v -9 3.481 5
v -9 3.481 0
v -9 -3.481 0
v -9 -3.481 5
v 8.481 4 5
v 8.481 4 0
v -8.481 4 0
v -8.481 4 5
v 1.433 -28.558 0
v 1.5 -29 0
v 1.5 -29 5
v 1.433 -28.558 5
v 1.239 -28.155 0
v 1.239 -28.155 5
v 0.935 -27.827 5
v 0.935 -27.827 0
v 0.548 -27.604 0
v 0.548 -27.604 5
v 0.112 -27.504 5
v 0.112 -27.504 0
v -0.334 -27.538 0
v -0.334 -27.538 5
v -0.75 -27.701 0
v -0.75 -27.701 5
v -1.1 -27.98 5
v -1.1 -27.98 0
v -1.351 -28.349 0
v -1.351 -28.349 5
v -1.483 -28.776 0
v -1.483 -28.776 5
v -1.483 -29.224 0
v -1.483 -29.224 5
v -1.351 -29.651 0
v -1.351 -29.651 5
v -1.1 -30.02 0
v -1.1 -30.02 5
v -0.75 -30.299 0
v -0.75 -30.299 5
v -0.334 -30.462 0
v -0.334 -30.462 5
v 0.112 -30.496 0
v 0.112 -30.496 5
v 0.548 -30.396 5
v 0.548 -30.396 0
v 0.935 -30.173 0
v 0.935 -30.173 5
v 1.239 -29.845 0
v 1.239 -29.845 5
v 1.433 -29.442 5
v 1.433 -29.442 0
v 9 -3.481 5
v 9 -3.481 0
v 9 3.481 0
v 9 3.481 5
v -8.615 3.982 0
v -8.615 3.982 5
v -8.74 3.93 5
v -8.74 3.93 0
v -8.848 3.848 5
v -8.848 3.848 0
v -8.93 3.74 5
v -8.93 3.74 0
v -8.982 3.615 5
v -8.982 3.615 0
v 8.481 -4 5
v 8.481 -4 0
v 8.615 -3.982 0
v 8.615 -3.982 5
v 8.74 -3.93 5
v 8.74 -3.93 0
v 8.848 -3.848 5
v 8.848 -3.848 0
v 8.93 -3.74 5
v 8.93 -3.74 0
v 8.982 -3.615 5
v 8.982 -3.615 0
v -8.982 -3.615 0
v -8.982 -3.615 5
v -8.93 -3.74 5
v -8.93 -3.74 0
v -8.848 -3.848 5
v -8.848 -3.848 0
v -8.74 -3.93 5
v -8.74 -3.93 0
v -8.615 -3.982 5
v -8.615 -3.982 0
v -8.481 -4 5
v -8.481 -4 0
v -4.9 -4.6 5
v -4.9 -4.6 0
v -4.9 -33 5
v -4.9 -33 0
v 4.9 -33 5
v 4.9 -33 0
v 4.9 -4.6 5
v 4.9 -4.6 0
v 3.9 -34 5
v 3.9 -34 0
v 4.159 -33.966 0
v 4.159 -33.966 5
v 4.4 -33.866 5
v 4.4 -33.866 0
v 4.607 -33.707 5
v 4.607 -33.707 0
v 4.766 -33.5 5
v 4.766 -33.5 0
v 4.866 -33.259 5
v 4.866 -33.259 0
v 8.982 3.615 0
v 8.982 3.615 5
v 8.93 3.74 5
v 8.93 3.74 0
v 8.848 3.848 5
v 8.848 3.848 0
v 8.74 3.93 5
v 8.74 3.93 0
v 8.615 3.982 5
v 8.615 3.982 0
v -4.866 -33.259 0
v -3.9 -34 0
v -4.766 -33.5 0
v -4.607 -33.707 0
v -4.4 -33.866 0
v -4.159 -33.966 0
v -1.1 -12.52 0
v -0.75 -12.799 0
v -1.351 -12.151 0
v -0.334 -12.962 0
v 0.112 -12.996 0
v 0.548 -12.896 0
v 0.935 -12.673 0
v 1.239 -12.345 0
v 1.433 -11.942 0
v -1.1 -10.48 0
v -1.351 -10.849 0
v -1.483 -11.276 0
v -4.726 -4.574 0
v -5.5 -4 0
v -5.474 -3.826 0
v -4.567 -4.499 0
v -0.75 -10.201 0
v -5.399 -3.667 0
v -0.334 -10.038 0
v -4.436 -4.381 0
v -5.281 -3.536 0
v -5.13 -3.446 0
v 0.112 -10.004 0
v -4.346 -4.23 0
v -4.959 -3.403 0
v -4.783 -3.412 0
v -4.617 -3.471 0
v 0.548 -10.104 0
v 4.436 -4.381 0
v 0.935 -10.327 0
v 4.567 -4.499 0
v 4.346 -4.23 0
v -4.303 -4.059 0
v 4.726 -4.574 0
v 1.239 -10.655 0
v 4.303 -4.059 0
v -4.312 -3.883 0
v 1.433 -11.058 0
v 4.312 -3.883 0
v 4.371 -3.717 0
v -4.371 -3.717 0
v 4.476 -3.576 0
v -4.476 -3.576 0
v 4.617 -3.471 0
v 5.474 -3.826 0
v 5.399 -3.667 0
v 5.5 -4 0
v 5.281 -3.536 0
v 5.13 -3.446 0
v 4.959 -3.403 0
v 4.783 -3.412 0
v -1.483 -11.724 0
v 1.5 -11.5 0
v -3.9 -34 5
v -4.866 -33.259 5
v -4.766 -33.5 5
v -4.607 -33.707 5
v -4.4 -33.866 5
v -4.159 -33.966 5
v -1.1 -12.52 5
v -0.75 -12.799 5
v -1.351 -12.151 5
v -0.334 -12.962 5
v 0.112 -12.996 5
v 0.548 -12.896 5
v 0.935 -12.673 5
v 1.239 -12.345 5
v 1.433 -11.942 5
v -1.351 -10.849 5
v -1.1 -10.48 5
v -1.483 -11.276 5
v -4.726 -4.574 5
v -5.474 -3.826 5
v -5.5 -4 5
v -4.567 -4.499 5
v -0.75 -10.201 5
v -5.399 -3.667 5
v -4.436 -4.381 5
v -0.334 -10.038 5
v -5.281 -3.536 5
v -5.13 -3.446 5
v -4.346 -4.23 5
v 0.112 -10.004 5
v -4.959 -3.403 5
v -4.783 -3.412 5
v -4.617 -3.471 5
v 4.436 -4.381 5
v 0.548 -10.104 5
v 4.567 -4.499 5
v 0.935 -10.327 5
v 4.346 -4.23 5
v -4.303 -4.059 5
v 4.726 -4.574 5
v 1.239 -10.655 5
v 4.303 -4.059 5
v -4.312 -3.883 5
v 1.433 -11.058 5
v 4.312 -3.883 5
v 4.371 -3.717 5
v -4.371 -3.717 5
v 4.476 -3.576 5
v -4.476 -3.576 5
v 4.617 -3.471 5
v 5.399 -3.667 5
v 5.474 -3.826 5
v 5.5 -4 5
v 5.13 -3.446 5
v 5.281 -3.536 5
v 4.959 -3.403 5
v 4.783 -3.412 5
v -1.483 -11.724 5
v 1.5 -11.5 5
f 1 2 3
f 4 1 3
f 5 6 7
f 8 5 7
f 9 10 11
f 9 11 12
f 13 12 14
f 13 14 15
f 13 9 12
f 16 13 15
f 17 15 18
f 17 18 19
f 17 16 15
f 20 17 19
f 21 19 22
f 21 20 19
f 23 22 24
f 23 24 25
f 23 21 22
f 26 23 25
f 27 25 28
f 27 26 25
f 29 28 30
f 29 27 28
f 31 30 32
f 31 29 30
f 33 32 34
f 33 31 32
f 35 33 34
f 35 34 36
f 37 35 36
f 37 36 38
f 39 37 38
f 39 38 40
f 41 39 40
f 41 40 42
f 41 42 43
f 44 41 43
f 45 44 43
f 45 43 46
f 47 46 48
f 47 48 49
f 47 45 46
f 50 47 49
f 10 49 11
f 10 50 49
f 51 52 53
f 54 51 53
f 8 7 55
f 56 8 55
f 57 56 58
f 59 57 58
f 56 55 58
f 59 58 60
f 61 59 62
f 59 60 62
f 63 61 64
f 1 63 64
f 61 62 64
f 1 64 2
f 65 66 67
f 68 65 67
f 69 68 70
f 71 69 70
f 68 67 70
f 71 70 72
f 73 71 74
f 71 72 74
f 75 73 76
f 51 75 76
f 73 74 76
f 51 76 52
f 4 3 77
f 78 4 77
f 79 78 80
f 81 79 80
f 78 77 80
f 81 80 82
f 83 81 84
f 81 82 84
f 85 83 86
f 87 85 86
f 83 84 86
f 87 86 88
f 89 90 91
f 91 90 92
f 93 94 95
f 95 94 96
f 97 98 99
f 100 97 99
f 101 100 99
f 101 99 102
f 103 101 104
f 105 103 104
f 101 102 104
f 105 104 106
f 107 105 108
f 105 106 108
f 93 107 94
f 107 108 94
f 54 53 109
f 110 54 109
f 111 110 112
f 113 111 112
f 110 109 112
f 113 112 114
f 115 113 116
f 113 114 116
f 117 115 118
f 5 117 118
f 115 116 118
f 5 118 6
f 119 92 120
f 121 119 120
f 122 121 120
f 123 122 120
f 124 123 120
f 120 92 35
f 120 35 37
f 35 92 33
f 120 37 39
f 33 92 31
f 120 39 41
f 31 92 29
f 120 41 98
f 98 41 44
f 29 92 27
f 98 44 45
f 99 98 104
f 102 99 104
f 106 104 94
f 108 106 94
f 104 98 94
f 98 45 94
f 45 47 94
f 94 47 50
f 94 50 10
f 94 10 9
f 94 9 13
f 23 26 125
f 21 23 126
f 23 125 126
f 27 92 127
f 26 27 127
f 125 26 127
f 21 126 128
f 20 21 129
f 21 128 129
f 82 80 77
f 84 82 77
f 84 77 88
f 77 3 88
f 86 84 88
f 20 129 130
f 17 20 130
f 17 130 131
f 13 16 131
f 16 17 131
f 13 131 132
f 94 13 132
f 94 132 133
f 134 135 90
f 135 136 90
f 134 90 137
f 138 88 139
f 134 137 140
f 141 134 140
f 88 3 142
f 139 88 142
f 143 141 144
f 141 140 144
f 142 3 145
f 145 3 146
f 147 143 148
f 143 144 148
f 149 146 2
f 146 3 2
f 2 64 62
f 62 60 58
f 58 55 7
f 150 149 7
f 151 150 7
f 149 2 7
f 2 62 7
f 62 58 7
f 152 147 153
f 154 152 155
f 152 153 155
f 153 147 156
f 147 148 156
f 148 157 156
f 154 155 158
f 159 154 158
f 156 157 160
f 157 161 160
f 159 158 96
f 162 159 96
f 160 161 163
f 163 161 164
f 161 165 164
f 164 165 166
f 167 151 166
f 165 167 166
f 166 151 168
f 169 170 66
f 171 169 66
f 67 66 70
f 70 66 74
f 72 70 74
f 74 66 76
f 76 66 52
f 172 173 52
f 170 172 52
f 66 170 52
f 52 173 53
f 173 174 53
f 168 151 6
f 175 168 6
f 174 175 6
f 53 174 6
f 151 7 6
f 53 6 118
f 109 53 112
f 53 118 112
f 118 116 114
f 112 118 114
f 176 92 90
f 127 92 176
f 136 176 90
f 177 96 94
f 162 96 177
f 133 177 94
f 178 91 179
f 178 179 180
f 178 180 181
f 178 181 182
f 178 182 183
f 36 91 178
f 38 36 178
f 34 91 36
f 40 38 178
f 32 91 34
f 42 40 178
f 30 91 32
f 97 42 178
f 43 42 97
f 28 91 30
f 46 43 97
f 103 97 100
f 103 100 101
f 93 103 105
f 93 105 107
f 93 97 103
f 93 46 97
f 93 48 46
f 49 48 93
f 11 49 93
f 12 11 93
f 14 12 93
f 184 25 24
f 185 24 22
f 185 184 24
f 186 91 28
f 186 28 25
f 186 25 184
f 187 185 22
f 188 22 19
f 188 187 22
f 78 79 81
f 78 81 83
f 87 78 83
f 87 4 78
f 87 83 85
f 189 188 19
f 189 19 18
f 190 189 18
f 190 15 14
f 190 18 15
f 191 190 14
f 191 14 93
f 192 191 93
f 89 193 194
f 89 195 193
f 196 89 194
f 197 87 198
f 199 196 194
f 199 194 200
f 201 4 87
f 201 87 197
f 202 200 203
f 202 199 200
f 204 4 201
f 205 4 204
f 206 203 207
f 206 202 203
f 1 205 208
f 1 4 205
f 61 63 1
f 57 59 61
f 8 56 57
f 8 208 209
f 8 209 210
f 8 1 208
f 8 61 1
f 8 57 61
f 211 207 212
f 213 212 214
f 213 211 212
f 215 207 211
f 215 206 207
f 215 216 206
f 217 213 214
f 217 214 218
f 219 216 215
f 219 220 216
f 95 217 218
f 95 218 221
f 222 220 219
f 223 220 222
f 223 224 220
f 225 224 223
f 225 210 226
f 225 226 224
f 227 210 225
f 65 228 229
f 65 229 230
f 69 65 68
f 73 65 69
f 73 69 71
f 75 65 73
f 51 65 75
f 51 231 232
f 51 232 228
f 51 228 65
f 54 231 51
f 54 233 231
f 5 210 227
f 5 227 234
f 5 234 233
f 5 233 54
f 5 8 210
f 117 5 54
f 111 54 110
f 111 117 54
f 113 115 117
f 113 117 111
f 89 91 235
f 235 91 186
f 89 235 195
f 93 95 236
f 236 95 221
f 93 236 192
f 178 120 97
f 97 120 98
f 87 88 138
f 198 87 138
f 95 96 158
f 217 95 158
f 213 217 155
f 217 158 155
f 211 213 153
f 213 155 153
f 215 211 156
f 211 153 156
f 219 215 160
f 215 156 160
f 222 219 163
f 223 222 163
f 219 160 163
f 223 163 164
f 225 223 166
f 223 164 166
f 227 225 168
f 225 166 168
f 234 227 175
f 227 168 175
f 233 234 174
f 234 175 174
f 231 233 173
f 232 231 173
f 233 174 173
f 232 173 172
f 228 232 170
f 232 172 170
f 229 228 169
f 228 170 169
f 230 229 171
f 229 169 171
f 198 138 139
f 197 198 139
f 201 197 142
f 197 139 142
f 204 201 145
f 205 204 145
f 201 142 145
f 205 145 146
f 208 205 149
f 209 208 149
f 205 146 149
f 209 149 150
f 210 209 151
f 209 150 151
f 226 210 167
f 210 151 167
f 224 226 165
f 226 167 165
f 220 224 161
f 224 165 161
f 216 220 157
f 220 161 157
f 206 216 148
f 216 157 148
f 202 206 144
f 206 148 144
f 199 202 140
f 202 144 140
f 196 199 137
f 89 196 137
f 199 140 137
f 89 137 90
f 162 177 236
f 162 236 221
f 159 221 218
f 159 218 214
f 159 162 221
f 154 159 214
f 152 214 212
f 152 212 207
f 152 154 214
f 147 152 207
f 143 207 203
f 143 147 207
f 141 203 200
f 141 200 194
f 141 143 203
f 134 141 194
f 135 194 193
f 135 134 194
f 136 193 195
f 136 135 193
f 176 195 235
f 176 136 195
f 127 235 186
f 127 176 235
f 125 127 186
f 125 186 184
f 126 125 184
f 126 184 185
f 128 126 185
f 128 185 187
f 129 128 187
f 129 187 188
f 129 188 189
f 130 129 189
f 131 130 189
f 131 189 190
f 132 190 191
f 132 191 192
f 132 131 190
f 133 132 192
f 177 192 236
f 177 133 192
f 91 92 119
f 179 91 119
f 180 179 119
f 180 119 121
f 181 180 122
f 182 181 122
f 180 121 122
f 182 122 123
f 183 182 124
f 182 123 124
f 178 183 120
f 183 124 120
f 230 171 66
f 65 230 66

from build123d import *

# Parameters (mm, degrees)
SKETCH_1_R      = 1.5
EXTRUDE_1_DEPTH = 5


with BuildPart() as part:
    # 草图1 → 凸台-拉伸1 (new body)
    with BuildSketch(Plane.XY):
        with BuildLine():
            Line((-4.9, -4.6), (-4.9, -33))
            ThreePointArc((-4.9, -33), (-4.607106781, -33.707106781), (-3.9, -34))
            Line((-3.9, -34), (3.9, -34))
            ThreePointArc((3.9, -34), (4.607106781, -33.707106781), (4.9, -33))
            Line((4.9, -33), (4.9, -4.6))
            ThreePointArc((4.9, -4.6), (4.475735931, -3.575735931), (5.5, -4))
            Line((5.5, -4), (5.9, -4))
            Line((5.9, -4), (8.480562012, -4))
            ThreePointArc((8.480562012, -4), (8.847860136, -3.847860136), (9, -3.480562012))
            Line((9, -3.480562012), (9, 3.480562012))
            ThreePointArc((9, 3.480562012), (8.847860136, 3.847860136), (8.480562012, 4))
            Line((8.480562012, 4), (-8.480562012, 4))
            ThreePointArc((-8.480562012, 4), (-8.847860136, 3.847860136), (-9, 3.480562012))
            Line((-9, 3.480562012), (-9, -3.480562012))
            ThreePointArc((-9, -3.480562012), (-8.847860136, -3.847860136), (-8.480562012, -4))
            Line((-8.480562012, -4), (-5.9, -4))
            Line((-5.9, -4), (-5.5, -4))
            ThreePointArc((-5.5, -4), (-4.475735931, -3.575735931), (-4.9, -4.6))
        make_face()
        with Locations((0, -11.5)):
            Circle(SKETCH_1_R, mode=Mode.SUBTRACT)
        with Locations((0, -29)):
            Circle(SKETCH_1_R, mode=Mode.SUBTRACT)
    extrude(amount=EXTRUDE_1_DEPTH)


solid = part.part
